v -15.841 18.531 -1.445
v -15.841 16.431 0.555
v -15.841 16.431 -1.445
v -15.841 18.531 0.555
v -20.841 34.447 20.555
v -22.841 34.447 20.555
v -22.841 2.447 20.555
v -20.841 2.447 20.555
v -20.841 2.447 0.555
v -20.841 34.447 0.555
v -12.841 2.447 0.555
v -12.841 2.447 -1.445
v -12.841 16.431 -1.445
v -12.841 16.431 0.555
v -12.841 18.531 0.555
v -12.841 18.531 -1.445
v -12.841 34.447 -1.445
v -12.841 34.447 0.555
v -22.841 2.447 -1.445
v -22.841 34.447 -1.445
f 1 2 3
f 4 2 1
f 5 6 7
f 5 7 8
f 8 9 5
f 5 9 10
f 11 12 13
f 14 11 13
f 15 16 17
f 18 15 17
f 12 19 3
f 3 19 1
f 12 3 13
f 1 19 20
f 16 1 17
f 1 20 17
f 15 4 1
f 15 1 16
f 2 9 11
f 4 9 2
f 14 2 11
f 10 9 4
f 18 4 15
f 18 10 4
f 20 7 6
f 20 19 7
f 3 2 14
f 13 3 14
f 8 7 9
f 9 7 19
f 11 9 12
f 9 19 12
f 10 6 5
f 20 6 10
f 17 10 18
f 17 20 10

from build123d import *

# Parameters (mm, degrees)
SKETCH034_W     = 10
SKETCH034_H     = 32
PAD018_DEPTH    = 2
SKETCH035_W     = 2
SKETCH035_H     = 32
PAD019_DEPTH    = 20
SKETCH036_W     = 3
SKETCH036_H     = 2.1
POCKET020_DEPTH = 2


with BuildPart() as part:
    # Sketch034 → Pad018 (new body)
    with BuildSketch(Plane.XY):
        with Locations((5, 16)):
            Rectangle(SKETCH034_W, SKETCH034_H)
    extrude(amount=PAD018_DEPTH)

    # Sketch035 (on Face6 of Pad018) → Pad019 (join)
    with BuildSketch(Plane.XY.offset(2)):
        with Locations((1, 16)):
            Rectangle(SKETCH035_W, SKETCH035_H)
    extrude(amount=PAD019_DEPTH)

    # Sketch036 (on Face3 of Pad019) → Pocket020 (cut)
    with BuildSketch(Plane.XY.offset(2)):
        with Locations((8.5, 15.0335876781)):
            Rectangle(SKETCH036_W, SKETCH036_H)
    extrude(amount=-POCKET020_DEPTH, mode=Mode.SUBTRACT)


with BuildPart() as part_1:
    # Body005 placement: moved
    add(part.part.moved(Location((-22.8412186, 2.4472869228, -1.4445826502))))


solid = part_1.part
